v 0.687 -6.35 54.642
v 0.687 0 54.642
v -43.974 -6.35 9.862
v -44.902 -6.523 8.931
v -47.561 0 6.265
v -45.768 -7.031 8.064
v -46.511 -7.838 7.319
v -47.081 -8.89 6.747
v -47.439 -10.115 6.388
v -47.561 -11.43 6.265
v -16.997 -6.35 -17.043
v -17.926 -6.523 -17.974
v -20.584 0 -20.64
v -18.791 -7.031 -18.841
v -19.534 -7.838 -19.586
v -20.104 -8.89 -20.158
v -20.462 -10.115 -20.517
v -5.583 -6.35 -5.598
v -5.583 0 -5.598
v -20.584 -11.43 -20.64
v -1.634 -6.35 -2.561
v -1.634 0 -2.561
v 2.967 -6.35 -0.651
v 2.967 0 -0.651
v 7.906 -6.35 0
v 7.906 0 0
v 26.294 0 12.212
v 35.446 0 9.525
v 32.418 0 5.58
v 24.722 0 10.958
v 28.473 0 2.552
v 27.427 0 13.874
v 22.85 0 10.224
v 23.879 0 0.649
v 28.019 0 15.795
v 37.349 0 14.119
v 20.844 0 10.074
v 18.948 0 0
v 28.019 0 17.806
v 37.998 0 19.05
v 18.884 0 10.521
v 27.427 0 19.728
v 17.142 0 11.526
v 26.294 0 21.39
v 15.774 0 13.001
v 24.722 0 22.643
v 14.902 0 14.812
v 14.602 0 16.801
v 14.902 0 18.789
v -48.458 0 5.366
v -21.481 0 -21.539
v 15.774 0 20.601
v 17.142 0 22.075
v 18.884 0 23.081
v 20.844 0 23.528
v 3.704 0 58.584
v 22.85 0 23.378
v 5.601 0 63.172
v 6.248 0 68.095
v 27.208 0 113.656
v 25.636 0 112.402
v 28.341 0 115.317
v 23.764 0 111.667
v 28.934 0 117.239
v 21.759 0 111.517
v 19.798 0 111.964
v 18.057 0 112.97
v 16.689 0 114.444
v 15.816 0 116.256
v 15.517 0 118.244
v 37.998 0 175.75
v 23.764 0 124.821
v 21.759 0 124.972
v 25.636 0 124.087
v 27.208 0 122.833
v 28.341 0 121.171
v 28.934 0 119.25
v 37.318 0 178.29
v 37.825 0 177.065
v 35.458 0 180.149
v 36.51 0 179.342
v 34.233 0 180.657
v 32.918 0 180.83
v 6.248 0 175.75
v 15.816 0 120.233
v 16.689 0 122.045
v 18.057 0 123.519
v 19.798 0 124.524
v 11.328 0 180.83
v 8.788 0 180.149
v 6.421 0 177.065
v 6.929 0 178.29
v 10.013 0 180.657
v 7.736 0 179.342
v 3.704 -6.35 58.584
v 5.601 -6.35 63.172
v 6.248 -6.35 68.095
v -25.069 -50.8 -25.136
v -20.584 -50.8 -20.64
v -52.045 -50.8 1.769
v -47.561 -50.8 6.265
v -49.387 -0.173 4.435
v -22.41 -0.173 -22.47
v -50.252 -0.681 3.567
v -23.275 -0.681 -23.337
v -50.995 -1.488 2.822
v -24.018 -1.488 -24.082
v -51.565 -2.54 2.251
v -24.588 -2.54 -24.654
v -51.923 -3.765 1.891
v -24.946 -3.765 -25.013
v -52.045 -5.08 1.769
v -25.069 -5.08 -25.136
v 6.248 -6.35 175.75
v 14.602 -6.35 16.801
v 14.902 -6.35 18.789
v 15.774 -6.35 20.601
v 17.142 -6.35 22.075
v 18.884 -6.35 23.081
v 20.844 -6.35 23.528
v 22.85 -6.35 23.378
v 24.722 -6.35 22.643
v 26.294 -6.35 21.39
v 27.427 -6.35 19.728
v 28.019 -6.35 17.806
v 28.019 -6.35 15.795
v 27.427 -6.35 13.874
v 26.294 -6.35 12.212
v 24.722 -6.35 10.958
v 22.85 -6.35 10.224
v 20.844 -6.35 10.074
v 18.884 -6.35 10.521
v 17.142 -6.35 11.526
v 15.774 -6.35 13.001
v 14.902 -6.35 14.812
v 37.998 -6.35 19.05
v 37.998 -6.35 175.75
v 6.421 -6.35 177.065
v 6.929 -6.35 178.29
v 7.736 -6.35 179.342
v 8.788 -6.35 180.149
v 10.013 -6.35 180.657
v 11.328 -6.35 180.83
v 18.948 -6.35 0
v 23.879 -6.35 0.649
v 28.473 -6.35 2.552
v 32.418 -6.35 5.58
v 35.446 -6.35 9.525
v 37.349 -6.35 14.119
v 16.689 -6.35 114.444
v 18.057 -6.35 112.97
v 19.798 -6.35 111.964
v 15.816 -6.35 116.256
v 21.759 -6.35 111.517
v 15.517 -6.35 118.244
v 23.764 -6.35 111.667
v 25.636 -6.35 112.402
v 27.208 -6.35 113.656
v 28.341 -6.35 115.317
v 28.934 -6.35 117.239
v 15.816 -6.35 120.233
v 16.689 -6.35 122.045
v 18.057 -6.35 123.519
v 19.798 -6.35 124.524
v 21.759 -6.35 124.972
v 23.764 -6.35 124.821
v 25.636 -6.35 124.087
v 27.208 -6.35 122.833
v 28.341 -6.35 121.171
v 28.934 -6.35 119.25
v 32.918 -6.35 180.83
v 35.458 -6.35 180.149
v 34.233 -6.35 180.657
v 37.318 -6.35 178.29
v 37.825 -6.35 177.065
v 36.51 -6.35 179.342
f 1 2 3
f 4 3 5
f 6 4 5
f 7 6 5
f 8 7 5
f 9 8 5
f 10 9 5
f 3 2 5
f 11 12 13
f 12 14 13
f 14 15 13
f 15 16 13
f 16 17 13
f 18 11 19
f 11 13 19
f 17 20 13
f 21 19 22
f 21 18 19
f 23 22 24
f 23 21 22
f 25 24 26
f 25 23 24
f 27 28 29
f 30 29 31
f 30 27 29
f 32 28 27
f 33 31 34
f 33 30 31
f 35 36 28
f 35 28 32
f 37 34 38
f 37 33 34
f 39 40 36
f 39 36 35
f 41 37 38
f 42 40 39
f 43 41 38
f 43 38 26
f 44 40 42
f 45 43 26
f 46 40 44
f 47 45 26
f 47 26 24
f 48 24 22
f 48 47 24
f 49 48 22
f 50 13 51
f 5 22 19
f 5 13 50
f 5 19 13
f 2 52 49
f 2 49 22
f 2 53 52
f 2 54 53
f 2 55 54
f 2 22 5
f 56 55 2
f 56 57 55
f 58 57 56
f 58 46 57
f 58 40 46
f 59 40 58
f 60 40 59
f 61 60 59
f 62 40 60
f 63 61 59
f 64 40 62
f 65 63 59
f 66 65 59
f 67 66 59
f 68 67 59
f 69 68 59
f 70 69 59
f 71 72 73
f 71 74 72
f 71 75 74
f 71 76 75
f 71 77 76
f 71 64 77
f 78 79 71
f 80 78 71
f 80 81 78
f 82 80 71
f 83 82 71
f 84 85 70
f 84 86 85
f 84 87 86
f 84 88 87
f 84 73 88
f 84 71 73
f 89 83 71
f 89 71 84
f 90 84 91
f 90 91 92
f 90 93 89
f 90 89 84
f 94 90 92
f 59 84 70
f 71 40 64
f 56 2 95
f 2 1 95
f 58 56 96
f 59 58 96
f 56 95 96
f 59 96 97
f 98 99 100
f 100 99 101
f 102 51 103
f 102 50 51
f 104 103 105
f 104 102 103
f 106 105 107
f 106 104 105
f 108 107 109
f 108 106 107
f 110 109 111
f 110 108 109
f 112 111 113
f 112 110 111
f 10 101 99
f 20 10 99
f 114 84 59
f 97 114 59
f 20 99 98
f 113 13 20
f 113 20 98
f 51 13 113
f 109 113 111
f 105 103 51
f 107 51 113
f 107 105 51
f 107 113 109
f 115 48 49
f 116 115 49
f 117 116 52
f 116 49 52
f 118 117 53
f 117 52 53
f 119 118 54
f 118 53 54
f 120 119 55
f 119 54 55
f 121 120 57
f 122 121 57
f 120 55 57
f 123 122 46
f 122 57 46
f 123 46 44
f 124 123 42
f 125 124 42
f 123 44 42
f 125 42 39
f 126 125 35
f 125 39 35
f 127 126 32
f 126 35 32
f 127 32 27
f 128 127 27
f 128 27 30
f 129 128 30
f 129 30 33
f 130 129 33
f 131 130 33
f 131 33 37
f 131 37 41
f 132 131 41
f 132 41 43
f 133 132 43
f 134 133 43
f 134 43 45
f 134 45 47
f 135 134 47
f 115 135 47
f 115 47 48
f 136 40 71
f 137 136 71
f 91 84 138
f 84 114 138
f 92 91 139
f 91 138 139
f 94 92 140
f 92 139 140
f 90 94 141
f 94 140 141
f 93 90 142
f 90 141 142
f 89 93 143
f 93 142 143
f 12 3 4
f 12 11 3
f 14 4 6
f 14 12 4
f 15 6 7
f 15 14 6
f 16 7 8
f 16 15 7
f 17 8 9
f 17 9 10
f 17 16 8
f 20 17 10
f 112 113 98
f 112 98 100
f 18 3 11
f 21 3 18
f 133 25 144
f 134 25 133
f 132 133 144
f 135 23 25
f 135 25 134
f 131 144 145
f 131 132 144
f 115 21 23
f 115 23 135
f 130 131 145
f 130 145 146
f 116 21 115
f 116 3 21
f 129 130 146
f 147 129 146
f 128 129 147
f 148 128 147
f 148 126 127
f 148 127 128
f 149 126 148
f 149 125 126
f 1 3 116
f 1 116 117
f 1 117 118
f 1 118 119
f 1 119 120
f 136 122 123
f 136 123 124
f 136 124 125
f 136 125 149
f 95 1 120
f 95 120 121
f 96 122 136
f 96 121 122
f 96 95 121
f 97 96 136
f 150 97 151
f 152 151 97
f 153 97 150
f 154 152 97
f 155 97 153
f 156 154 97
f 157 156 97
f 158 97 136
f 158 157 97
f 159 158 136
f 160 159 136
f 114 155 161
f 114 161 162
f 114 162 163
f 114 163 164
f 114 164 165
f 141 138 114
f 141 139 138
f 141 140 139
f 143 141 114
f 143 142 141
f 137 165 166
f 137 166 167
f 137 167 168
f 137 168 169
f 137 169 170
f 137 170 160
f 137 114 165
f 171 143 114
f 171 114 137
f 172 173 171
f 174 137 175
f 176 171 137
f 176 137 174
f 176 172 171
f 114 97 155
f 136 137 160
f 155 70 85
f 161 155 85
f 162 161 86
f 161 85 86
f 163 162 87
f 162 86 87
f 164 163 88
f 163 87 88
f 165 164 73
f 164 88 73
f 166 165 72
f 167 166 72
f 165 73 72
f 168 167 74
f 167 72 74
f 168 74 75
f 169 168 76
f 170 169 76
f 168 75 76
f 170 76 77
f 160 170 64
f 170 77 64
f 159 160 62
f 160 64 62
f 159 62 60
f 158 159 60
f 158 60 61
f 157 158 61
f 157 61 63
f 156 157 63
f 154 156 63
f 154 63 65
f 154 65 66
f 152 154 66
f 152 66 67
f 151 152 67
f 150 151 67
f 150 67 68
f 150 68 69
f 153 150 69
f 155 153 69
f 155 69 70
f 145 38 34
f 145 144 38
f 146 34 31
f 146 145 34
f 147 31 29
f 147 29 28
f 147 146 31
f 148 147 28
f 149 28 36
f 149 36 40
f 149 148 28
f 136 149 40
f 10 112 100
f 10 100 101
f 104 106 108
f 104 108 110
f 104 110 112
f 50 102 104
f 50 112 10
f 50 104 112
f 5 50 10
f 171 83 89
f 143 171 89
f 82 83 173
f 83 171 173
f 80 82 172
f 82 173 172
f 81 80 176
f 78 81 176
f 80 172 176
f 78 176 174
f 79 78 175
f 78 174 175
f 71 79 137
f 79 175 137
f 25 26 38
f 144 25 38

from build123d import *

# Parameters (mm, degrees)
F1_DEPTH = 6.35
F3_DEPTH = 50.8
F5_D     = 13.49248
F6_R     = 19.05
F7_R     = 5.08
F8_R     = 5.08


# Not quite as in the source:
# - a feature names something its author has since deleted; it is built from what else it names


with BuildPart() as f1:
    # F0 (on Front) → F1 (new body)
    with BuildSketch(Plane.XZ):
        Polygon((37.9981123171, 180.8299914), (6.2481123171, 180.8299914), (6.2481123171, 60.2186896705), (-47.5612342455, 6.2650593709), (-20.5844190958, -20.6396139104), (0, 0), (6.2481123171, 0), (37.9981123171, 0), (37.9981123171, 33.02), align=None)
    extrude(amount=F1_DEPTH)

    # F2 (on face) → F3 (join)
    with BuildSketch(Plane(origin=(0, 0, 0), x_dir=(-1, 0, 0), z_dir=(0, 1, 0))):
        Polygon((52.0453464591, 1.7689235126), (47.5612342455, 6.2650593709), (20.5844190958, -20.6396139104), (25.0685313093, -25.1357497687), align=None)
    extrude(amount=-F3_DEPTH)

    # F5 (through all)
    with Locations(Plane.XZ.offset(6.35)):
        with Locations((22.2628123171, 118.2443914), (21.3484123171, 16.8009124652)):
            Hole(F5_D / 2)

    # F6
    f6_edges = [f1.edges().sort_by_distance(p)[0] for p in [
        (6.248112, -3.175, 60.21869),
        (37.998112, -3.175, 0),
        (0, -3.175, 0),
    ]]
    fillet(f6_edges, radius=F6_R)

    # F7
    f7_edges = [f1.edges().sort_by_distance(p)[0] for p in [
        (-38.556939, 0, -11.683413),
        (-34.072827, -6.35, -7.187277),
    ]]
    fillet(f7_edges, radius=F7_R)

    # F8
    f8_edges = [f1.edges().sort_by_distance(p)[0] for p in [
        (6.248112, -3.175, 180.829991),
        (37.998112, -3.175, 180.829991),
    ]]
    fillet(f8_edges, radius=F8_R)


solid = f1.part
